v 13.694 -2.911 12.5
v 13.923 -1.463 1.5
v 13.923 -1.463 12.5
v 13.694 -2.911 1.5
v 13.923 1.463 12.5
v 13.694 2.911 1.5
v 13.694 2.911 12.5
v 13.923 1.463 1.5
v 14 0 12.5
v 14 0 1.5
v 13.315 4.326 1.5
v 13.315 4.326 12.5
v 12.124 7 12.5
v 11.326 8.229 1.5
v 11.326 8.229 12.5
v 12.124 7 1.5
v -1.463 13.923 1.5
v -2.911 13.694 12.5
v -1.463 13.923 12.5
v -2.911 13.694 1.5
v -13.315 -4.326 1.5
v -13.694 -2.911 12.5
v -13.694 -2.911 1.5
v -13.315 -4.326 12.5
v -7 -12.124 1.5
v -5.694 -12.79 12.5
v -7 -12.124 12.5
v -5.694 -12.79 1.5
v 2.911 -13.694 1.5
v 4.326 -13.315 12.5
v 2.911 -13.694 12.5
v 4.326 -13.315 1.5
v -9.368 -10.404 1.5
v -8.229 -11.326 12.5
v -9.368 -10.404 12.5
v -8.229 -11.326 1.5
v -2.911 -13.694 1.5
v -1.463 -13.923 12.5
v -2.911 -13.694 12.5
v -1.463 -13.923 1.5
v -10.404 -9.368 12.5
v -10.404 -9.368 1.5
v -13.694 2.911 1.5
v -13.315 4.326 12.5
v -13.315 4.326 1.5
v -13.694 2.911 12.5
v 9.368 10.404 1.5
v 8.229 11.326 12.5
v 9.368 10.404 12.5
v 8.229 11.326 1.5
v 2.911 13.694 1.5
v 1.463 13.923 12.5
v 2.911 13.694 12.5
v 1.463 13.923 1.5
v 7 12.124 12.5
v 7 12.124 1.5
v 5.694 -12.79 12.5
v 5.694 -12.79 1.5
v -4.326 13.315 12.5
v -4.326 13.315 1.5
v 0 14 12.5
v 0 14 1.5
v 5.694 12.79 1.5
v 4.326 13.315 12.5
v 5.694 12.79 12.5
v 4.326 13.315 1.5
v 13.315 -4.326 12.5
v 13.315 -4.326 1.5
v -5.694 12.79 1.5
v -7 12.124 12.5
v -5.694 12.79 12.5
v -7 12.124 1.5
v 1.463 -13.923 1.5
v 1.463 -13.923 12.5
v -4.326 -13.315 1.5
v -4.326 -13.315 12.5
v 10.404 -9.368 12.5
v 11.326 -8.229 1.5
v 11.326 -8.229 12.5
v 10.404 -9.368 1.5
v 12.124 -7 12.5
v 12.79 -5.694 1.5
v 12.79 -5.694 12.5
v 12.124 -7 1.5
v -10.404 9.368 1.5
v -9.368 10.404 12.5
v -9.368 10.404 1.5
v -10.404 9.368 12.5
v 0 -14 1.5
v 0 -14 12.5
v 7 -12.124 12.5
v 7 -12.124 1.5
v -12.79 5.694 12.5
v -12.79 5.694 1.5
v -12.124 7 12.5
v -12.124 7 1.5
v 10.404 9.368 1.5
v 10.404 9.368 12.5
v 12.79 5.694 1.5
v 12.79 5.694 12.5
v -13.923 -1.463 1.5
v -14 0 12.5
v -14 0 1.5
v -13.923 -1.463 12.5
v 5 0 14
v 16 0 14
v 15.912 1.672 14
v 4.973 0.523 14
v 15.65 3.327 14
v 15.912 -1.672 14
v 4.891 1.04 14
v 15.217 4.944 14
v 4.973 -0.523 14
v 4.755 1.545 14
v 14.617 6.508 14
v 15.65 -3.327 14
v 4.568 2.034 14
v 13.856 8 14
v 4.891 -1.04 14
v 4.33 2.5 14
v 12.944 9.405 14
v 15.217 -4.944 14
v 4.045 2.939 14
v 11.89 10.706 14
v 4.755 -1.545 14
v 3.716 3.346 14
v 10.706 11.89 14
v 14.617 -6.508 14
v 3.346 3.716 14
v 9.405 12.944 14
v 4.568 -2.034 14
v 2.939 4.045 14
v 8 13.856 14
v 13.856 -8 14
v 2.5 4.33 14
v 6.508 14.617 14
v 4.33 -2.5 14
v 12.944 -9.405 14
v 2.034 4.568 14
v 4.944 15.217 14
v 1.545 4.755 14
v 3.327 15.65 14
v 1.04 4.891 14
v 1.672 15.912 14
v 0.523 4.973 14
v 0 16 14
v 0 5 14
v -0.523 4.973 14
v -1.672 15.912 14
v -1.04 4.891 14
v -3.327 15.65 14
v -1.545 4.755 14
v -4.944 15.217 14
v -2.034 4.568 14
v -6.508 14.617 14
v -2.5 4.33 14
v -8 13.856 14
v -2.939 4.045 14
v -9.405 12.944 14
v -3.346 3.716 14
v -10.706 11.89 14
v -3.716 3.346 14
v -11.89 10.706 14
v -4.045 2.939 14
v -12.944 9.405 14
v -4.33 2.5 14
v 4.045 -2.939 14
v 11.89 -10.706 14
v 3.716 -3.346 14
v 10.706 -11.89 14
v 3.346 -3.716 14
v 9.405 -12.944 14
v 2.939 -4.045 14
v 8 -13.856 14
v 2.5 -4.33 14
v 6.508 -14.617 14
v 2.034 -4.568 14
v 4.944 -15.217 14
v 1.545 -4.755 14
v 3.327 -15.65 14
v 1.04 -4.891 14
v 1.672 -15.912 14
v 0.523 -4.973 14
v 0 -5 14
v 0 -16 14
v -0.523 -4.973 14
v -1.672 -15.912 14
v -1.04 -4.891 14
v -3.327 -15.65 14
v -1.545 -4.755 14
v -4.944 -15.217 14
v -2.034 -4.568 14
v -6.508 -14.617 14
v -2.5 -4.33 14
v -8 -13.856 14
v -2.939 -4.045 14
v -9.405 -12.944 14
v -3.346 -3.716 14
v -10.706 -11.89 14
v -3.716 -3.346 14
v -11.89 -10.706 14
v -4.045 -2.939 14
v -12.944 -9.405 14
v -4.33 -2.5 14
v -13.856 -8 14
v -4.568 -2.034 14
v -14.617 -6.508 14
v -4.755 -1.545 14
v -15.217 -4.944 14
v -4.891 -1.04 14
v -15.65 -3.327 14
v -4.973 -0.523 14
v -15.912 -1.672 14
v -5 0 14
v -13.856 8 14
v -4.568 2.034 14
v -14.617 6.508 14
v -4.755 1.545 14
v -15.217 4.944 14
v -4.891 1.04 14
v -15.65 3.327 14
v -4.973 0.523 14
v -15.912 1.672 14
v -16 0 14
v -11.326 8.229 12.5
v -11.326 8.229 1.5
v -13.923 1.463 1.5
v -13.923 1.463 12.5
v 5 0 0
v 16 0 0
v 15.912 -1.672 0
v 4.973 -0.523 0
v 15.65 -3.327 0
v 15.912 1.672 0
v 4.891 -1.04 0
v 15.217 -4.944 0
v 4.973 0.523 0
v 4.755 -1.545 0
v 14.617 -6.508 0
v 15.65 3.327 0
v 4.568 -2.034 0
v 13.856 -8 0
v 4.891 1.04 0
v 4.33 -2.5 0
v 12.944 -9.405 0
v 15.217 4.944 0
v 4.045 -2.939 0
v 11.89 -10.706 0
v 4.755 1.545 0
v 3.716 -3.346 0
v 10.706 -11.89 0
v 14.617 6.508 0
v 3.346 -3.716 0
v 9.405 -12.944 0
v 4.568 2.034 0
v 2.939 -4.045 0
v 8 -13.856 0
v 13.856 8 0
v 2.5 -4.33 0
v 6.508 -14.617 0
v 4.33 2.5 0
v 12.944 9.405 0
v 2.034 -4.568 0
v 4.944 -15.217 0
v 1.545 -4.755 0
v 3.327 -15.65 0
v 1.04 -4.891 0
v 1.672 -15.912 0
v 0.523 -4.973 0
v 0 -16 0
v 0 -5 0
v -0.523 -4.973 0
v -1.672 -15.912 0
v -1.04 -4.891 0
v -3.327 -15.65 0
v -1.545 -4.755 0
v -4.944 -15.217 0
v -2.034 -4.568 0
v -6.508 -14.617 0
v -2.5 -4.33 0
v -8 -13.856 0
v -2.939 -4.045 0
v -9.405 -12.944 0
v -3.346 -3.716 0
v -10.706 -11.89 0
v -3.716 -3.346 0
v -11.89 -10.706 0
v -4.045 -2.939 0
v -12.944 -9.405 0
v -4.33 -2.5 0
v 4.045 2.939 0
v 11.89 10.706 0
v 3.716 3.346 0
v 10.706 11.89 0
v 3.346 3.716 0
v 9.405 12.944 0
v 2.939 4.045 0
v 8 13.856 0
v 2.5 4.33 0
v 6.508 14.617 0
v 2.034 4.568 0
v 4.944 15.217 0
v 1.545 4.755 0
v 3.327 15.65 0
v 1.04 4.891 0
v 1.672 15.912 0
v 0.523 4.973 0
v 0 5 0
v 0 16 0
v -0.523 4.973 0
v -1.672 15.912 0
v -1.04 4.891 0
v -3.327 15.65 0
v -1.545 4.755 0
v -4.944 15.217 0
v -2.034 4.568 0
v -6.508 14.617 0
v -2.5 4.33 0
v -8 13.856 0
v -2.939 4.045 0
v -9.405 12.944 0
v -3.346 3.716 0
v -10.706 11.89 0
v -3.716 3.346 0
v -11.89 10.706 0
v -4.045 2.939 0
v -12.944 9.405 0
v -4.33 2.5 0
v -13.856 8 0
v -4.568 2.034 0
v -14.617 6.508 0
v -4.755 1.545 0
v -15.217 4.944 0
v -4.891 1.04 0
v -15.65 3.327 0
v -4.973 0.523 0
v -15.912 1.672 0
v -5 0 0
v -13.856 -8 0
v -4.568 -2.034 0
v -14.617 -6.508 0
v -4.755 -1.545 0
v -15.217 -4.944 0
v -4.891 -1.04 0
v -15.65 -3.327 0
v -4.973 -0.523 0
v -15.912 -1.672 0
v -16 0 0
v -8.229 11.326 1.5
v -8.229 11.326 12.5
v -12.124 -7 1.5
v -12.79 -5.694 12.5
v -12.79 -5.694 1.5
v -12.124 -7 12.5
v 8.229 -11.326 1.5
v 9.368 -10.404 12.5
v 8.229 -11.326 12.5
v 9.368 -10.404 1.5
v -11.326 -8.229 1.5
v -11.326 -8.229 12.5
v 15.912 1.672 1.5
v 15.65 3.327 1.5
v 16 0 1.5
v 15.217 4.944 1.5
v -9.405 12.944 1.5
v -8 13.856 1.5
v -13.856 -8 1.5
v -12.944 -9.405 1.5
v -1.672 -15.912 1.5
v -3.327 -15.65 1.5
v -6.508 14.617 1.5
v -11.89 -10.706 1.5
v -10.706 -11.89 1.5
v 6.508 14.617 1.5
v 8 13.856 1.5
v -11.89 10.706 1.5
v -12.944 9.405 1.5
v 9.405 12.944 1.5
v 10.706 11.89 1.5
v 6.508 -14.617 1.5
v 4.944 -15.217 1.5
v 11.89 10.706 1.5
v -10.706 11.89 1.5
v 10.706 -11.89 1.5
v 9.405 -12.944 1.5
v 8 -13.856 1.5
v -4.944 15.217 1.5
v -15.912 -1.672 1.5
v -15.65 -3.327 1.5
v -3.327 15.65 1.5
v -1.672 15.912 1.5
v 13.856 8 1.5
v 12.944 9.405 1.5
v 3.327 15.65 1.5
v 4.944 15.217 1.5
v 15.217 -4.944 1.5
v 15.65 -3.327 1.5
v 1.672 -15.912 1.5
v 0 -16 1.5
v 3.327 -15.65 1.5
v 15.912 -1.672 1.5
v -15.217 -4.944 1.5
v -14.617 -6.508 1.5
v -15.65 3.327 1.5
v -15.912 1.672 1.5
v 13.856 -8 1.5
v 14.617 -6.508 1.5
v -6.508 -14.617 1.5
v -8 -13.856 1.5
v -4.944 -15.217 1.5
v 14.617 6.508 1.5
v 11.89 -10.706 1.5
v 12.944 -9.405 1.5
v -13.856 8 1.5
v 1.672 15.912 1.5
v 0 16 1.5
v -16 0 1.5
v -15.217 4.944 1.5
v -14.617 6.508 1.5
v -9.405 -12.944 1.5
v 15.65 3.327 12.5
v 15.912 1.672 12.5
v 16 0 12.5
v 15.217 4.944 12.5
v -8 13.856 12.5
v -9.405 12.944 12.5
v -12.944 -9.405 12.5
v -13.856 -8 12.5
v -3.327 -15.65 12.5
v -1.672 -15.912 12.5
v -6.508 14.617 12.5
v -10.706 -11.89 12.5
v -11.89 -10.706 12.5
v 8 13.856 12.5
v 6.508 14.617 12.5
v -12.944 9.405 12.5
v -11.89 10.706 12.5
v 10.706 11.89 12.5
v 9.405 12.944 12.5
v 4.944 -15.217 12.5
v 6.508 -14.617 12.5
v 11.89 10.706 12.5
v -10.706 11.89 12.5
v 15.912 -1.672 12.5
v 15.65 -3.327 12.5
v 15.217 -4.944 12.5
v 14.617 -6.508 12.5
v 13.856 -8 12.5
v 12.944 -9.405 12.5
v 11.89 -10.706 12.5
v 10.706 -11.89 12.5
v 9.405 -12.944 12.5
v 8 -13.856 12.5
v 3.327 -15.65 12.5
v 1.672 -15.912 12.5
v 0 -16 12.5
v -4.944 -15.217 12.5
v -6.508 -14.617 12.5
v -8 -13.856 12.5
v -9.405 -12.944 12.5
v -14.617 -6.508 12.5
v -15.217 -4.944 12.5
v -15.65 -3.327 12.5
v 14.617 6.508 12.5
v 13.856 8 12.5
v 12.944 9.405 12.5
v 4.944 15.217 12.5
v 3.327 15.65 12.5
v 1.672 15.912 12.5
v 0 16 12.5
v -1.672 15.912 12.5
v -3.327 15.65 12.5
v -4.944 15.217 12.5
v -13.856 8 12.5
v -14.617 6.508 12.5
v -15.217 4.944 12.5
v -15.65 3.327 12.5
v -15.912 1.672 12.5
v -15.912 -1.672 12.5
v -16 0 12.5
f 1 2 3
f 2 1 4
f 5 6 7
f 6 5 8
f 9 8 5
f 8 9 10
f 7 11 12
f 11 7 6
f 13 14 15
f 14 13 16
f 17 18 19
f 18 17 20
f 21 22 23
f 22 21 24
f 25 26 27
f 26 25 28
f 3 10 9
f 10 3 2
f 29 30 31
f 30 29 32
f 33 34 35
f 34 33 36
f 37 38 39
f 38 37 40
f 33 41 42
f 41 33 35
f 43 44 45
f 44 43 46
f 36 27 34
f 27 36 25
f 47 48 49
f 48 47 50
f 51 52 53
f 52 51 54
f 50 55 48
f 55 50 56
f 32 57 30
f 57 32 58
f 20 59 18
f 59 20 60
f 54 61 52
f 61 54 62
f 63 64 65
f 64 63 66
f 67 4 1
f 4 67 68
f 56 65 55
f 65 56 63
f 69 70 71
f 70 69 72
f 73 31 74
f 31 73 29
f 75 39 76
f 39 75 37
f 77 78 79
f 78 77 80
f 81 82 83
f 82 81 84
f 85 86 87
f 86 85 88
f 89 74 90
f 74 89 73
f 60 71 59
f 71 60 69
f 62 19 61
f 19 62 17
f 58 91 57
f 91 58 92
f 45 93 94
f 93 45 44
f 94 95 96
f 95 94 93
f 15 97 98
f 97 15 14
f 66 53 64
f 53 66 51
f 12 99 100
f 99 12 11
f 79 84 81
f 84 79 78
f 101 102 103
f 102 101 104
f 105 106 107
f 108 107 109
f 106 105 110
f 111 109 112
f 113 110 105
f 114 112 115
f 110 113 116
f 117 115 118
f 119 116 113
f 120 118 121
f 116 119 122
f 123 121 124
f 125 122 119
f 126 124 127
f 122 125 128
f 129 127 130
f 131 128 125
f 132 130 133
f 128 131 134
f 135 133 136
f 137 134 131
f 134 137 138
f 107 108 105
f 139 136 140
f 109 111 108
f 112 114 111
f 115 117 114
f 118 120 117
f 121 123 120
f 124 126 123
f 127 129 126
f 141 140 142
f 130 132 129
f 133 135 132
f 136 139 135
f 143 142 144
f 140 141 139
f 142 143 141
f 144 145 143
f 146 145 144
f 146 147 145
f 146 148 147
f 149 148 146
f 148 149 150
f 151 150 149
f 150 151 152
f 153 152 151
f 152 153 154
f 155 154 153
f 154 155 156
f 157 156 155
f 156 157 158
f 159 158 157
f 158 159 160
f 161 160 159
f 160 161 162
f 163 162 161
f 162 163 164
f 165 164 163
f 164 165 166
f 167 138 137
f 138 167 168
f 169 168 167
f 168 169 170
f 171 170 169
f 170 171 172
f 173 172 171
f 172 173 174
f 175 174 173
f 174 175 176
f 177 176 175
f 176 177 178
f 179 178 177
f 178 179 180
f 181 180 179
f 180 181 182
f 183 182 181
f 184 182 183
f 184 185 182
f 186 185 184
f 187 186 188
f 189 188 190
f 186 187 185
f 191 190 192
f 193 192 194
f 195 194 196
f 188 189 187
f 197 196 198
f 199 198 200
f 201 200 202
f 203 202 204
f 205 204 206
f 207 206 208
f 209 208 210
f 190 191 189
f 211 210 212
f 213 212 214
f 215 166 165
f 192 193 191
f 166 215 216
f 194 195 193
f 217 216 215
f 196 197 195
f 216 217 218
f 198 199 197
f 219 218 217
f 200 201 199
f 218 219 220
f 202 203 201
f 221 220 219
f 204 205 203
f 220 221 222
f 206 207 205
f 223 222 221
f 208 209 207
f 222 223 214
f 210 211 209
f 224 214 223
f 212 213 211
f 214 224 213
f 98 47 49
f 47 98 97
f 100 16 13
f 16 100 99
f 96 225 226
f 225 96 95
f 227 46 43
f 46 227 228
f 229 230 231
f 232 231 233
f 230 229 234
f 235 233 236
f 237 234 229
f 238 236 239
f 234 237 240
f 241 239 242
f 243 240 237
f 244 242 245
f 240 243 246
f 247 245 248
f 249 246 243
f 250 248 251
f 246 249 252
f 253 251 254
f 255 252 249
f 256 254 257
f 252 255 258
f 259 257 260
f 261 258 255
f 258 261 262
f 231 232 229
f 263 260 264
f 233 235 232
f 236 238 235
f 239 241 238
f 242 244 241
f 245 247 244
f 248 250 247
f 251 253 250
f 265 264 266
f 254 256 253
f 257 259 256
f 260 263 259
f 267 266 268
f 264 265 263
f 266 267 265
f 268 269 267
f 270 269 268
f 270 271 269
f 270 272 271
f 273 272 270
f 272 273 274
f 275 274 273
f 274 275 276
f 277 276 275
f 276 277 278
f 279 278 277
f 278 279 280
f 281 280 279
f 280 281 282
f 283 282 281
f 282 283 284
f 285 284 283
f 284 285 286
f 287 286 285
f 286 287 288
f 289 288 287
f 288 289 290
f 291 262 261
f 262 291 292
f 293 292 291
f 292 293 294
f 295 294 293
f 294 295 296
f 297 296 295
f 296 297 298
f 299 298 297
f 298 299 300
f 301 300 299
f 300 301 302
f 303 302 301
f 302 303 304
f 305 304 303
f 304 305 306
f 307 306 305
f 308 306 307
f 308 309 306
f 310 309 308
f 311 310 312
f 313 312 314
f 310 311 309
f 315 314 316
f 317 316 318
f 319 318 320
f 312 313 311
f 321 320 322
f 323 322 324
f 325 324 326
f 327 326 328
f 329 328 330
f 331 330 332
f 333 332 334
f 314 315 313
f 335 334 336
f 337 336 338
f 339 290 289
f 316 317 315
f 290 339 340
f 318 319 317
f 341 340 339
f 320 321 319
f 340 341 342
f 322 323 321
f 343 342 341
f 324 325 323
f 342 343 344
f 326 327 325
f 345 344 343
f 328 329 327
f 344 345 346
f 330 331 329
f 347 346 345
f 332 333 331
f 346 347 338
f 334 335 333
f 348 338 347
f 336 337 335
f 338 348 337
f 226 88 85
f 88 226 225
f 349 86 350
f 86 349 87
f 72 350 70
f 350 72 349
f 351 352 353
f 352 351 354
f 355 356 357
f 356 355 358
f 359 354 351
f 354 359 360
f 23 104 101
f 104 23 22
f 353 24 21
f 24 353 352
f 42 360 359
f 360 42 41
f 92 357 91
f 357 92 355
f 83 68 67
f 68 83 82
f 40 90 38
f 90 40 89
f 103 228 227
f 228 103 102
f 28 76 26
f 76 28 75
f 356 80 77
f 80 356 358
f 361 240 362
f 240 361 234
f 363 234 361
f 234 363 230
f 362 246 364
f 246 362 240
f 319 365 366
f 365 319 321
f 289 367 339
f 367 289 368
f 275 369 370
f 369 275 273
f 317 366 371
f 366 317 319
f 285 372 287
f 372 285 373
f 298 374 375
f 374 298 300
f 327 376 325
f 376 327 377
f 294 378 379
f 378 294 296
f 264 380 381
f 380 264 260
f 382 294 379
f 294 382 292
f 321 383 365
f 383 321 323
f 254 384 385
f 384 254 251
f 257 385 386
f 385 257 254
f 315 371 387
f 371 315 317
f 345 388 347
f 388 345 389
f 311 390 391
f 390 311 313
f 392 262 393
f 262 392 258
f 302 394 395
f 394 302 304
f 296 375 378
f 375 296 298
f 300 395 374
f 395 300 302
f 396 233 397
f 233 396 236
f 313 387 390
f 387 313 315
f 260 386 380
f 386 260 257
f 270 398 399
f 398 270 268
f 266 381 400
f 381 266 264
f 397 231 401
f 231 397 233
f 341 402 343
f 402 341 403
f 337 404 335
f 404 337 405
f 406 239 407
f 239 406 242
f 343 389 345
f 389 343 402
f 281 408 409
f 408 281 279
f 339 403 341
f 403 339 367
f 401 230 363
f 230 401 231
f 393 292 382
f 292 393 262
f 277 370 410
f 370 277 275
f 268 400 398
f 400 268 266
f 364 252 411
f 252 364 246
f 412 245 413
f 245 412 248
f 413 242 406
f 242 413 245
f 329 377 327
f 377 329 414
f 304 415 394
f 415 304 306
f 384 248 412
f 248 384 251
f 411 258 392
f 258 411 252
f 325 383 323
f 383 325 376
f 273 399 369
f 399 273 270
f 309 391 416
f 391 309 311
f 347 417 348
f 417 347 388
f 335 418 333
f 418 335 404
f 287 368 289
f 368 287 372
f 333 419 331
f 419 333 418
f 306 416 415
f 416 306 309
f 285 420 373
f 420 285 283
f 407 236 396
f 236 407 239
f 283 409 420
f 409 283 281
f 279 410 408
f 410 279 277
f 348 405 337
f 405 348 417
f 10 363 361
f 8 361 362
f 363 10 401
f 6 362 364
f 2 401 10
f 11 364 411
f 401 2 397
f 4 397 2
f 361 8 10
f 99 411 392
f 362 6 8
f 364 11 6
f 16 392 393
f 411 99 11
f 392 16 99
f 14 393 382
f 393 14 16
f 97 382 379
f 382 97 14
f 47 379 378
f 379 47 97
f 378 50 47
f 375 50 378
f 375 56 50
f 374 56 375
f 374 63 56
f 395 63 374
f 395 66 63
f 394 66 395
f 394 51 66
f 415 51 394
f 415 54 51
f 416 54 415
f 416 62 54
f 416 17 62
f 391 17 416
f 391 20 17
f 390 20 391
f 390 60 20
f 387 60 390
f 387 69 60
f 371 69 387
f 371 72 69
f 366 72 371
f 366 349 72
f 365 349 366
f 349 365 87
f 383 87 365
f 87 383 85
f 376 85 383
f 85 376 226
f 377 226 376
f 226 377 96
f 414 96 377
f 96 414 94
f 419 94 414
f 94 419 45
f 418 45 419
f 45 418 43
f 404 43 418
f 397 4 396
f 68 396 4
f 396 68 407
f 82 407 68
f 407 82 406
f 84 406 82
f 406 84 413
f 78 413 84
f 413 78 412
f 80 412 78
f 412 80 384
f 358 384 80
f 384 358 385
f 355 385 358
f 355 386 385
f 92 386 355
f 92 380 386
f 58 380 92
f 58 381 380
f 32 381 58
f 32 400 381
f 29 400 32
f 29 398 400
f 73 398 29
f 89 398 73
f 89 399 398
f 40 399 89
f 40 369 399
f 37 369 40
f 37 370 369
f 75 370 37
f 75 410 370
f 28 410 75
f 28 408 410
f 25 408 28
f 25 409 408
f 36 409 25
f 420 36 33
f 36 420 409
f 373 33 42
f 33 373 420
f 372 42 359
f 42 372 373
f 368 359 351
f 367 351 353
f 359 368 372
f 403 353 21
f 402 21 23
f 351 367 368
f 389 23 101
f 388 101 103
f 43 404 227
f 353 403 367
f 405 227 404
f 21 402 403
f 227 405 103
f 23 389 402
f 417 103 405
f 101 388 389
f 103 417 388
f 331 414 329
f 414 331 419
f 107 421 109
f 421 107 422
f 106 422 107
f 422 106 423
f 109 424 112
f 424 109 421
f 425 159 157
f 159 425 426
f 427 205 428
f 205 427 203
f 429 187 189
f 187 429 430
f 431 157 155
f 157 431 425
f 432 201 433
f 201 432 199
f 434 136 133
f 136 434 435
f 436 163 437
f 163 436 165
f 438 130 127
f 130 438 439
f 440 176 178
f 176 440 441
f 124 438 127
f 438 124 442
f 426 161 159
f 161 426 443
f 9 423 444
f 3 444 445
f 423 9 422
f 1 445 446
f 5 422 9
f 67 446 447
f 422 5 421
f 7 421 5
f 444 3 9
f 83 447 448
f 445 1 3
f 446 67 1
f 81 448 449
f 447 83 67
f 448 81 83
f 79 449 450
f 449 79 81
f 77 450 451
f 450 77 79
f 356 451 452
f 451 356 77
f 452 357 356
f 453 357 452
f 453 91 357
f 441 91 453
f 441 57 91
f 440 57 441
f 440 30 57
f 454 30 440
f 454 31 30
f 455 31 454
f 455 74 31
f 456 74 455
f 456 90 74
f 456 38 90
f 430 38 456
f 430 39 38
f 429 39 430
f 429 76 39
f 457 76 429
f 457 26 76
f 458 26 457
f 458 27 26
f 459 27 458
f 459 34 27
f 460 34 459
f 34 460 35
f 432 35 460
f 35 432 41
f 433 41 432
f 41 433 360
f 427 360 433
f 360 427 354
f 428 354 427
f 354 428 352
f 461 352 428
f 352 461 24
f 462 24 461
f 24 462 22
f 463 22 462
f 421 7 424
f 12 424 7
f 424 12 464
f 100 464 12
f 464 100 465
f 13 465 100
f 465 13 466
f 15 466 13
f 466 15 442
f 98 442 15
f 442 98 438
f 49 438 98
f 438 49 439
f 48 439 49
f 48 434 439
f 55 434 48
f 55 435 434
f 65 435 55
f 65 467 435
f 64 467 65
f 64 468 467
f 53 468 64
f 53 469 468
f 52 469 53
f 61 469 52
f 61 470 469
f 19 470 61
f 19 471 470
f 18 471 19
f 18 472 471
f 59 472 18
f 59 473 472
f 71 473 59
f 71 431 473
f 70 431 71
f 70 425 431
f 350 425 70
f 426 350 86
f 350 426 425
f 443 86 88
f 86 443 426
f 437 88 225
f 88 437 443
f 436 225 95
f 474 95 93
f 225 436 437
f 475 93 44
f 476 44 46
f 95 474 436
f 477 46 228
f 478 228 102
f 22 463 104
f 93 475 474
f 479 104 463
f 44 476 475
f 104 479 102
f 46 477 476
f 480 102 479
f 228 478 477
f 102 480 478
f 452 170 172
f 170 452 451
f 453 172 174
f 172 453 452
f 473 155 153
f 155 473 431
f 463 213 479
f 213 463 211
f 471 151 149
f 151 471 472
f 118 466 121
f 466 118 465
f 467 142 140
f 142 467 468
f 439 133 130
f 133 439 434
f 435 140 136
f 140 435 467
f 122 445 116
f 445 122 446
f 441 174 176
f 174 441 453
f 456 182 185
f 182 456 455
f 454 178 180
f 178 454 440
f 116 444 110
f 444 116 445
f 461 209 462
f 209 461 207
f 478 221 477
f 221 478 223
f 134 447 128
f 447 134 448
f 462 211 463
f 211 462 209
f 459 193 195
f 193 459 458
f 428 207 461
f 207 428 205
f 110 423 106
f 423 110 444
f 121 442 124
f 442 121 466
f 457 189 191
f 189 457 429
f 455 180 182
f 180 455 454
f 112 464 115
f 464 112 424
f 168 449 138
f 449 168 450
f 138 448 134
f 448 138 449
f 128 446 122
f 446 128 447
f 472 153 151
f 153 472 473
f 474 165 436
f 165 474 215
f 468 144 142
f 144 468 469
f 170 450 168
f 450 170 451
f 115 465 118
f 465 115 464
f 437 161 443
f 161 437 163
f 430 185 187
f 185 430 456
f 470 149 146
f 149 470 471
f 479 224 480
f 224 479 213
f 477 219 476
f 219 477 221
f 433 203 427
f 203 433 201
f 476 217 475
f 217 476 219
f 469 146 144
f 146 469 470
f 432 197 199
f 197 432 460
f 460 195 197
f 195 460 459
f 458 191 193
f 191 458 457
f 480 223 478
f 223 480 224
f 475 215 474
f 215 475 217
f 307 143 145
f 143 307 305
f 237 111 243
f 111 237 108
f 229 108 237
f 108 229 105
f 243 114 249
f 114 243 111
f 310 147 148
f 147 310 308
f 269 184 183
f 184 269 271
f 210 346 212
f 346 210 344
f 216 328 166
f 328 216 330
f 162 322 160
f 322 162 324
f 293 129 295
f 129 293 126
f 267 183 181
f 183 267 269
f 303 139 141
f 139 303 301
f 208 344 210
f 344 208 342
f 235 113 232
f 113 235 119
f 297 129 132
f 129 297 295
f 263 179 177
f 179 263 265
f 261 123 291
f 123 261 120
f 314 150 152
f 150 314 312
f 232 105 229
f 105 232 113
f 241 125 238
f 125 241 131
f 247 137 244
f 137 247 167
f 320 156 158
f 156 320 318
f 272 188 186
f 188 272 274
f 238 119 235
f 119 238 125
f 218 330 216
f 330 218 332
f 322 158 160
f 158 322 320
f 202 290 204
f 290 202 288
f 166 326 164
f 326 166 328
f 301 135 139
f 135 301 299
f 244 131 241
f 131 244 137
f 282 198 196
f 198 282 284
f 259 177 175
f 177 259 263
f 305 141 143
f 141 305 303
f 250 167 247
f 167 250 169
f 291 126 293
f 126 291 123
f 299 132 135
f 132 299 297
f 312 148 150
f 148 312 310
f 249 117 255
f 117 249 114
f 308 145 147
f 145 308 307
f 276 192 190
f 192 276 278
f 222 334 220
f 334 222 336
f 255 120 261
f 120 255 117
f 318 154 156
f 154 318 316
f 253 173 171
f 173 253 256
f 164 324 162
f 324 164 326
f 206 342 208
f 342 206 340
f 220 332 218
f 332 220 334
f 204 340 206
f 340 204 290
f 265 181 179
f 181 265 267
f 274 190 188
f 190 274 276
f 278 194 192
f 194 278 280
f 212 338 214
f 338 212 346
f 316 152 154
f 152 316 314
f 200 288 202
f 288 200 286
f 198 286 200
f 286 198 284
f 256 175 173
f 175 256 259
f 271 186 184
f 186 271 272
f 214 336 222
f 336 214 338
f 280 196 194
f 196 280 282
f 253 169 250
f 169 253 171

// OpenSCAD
// Plain idler pulley with retaining flanges.
$fn = 60;
eps = 0.02;
bore_d = 10;
body_d = 28;
width = 14;
flange_t = 1.5;
difference() {
    union() {
        cylinder(d=body_d,h=width);
        cylinder(d=body_d+4,h=flange_t);
        translate([0,0,width-flange_t]) cylinder(d=body_d+4,h=flange_t);
    }
    translate([0,0,-eps]) cylinder(d=bore_d,h=width+2*eps);
}
